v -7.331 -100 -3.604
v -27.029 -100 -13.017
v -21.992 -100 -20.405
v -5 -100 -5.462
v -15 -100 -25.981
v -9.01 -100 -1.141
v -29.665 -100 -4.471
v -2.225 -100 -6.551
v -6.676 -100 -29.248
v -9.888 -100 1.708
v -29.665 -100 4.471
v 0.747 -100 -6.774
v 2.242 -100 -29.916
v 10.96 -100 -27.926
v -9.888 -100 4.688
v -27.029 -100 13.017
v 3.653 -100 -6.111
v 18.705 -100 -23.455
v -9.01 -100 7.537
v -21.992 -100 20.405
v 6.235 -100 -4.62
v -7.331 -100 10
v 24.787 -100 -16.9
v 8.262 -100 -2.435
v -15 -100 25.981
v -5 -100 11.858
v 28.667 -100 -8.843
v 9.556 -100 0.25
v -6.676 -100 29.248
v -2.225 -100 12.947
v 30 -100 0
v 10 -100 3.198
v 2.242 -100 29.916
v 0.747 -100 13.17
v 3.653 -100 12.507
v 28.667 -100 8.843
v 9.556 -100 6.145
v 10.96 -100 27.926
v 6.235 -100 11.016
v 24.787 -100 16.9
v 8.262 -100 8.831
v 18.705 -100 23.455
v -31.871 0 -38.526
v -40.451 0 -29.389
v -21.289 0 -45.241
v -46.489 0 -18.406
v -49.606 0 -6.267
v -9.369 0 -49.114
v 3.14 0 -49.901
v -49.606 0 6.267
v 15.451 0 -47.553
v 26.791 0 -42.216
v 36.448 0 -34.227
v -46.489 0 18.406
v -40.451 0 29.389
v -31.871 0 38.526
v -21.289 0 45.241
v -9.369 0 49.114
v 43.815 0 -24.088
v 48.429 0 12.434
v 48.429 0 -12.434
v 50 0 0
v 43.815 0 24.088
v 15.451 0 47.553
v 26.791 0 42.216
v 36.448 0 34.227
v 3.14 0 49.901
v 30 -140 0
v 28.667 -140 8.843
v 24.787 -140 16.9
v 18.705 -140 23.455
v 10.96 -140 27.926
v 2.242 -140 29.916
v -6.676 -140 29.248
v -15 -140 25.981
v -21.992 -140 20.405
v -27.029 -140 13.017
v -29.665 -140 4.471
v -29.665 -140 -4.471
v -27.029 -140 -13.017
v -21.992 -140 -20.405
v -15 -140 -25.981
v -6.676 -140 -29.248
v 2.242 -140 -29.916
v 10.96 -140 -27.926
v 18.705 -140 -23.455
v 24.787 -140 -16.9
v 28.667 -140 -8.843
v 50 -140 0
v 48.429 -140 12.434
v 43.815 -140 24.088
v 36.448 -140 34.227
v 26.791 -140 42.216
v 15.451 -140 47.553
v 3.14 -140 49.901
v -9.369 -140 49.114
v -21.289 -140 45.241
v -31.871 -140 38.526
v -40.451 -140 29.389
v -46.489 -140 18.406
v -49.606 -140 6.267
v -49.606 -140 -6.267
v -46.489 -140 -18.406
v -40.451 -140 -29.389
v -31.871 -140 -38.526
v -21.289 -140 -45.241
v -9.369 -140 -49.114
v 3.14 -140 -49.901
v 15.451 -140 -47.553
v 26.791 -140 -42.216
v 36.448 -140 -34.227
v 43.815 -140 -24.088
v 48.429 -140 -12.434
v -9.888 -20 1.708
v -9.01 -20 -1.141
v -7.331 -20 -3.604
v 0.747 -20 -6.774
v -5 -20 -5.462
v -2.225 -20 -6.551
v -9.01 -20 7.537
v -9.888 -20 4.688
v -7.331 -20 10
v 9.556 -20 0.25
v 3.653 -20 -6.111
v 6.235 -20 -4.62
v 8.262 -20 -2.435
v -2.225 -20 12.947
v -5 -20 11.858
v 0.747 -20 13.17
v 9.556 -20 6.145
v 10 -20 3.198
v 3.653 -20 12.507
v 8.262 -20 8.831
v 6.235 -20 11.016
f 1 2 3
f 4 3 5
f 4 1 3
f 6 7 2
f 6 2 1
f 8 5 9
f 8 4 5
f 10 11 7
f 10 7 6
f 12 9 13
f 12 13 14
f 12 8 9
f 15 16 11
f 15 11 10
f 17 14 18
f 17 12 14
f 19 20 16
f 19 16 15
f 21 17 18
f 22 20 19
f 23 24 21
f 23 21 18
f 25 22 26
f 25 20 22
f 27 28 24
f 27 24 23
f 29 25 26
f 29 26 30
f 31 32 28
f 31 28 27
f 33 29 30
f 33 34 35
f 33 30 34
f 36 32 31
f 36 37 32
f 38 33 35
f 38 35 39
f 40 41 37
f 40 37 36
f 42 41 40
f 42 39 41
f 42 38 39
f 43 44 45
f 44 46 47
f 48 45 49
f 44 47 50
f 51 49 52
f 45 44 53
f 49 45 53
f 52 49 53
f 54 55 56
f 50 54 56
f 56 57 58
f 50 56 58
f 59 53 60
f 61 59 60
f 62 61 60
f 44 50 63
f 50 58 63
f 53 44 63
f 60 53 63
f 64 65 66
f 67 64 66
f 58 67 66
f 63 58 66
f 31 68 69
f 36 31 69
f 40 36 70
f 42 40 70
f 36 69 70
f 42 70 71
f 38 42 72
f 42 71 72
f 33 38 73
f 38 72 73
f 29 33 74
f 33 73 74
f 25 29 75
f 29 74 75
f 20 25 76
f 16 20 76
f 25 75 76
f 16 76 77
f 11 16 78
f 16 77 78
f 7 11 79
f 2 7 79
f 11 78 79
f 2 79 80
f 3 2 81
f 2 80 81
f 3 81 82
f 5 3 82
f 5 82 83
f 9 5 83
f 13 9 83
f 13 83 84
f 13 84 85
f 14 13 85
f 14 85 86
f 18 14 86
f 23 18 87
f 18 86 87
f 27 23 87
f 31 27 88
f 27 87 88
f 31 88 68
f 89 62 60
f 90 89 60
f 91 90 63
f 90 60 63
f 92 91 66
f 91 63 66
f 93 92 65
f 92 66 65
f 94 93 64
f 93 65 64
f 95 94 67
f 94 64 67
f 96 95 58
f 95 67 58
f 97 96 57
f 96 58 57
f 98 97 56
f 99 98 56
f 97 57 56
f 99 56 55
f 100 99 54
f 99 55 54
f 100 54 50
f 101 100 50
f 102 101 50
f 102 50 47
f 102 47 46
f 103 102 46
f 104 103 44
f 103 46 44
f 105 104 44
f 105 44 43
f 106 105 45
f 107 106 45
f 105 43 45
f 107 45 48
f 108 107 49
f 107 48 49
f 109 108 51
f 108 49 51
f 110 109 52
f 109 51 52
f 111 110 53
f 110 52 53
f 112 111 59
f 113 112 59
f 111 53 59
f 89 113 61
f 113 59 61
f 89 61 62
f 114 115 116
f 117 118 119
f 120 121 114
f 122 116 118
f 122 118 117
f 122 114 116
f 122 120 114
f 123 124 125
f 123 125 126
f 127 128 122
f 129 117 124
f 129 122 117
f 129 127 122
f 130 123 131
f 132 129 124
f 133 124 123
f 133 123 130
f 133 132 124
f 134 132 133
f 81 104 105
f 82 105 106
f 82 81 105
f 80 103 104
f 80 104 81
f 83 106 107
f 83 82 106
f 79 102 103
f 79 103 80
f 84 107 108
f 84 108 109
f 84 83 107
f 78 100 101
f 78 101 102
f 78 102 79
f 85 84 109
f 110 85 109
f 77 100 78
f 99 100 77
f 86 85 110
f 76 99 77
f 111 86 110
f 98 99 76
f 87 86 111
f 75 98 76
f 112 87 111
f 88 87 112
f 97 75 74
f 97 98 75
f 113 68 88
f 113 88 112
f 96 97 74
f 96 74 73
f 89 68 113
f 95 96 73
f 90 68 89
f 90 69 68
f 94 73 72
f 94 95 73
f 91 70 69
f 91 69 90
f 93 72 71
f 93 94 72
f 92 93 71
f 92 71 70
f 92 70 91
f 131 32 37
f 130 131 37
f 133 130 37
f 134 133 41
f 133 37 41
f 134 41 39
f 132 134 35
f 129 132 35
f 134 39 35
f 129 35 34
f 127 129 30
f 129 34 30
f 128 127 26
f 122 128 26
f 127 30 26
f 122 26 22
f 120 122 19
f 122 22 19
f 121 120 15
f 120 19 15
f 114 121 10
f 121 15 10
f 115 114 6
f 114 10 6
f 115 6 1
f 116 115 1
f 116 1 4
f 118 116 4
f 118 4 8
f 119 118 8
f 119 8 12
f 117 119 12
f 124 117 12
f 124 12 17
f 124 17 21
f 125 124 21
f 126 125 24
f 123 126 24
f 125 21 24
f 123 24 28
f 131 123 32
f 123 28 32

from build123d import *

# Parameters (mm, degrees)
F0_R     = 50
F1_DEPTH = 140
F2_R     = 30
F3_DEPTH = 40
F4_R     = 10
F5_DEPTH = 80


with BuildPart() as f1:
    # F0 (on Front) → F1 (new body)
    with BuildSketch(Plane.XZ):
        Circle(F0_R)
    extrude(amount=F1_DEPTH)

    # F2 (on face) → F3 (cut)
    with BuildSketch(Plane.XZ.offset(140)):
        Circle(F2_R)
    extrude(amount=-F3_DEPTH, mode=Mode.SUBTRACT)

    # F4 (on face) → F5 (cut)
    with BuildSketch(Plane.XZ.offset(100)):
        with Locations((0, 3.197924)):
            Circle(F4_R)
    extrude(amount=-F5_DEPTH, mode=Mode.SUBTRACT)


solid = f1.part
